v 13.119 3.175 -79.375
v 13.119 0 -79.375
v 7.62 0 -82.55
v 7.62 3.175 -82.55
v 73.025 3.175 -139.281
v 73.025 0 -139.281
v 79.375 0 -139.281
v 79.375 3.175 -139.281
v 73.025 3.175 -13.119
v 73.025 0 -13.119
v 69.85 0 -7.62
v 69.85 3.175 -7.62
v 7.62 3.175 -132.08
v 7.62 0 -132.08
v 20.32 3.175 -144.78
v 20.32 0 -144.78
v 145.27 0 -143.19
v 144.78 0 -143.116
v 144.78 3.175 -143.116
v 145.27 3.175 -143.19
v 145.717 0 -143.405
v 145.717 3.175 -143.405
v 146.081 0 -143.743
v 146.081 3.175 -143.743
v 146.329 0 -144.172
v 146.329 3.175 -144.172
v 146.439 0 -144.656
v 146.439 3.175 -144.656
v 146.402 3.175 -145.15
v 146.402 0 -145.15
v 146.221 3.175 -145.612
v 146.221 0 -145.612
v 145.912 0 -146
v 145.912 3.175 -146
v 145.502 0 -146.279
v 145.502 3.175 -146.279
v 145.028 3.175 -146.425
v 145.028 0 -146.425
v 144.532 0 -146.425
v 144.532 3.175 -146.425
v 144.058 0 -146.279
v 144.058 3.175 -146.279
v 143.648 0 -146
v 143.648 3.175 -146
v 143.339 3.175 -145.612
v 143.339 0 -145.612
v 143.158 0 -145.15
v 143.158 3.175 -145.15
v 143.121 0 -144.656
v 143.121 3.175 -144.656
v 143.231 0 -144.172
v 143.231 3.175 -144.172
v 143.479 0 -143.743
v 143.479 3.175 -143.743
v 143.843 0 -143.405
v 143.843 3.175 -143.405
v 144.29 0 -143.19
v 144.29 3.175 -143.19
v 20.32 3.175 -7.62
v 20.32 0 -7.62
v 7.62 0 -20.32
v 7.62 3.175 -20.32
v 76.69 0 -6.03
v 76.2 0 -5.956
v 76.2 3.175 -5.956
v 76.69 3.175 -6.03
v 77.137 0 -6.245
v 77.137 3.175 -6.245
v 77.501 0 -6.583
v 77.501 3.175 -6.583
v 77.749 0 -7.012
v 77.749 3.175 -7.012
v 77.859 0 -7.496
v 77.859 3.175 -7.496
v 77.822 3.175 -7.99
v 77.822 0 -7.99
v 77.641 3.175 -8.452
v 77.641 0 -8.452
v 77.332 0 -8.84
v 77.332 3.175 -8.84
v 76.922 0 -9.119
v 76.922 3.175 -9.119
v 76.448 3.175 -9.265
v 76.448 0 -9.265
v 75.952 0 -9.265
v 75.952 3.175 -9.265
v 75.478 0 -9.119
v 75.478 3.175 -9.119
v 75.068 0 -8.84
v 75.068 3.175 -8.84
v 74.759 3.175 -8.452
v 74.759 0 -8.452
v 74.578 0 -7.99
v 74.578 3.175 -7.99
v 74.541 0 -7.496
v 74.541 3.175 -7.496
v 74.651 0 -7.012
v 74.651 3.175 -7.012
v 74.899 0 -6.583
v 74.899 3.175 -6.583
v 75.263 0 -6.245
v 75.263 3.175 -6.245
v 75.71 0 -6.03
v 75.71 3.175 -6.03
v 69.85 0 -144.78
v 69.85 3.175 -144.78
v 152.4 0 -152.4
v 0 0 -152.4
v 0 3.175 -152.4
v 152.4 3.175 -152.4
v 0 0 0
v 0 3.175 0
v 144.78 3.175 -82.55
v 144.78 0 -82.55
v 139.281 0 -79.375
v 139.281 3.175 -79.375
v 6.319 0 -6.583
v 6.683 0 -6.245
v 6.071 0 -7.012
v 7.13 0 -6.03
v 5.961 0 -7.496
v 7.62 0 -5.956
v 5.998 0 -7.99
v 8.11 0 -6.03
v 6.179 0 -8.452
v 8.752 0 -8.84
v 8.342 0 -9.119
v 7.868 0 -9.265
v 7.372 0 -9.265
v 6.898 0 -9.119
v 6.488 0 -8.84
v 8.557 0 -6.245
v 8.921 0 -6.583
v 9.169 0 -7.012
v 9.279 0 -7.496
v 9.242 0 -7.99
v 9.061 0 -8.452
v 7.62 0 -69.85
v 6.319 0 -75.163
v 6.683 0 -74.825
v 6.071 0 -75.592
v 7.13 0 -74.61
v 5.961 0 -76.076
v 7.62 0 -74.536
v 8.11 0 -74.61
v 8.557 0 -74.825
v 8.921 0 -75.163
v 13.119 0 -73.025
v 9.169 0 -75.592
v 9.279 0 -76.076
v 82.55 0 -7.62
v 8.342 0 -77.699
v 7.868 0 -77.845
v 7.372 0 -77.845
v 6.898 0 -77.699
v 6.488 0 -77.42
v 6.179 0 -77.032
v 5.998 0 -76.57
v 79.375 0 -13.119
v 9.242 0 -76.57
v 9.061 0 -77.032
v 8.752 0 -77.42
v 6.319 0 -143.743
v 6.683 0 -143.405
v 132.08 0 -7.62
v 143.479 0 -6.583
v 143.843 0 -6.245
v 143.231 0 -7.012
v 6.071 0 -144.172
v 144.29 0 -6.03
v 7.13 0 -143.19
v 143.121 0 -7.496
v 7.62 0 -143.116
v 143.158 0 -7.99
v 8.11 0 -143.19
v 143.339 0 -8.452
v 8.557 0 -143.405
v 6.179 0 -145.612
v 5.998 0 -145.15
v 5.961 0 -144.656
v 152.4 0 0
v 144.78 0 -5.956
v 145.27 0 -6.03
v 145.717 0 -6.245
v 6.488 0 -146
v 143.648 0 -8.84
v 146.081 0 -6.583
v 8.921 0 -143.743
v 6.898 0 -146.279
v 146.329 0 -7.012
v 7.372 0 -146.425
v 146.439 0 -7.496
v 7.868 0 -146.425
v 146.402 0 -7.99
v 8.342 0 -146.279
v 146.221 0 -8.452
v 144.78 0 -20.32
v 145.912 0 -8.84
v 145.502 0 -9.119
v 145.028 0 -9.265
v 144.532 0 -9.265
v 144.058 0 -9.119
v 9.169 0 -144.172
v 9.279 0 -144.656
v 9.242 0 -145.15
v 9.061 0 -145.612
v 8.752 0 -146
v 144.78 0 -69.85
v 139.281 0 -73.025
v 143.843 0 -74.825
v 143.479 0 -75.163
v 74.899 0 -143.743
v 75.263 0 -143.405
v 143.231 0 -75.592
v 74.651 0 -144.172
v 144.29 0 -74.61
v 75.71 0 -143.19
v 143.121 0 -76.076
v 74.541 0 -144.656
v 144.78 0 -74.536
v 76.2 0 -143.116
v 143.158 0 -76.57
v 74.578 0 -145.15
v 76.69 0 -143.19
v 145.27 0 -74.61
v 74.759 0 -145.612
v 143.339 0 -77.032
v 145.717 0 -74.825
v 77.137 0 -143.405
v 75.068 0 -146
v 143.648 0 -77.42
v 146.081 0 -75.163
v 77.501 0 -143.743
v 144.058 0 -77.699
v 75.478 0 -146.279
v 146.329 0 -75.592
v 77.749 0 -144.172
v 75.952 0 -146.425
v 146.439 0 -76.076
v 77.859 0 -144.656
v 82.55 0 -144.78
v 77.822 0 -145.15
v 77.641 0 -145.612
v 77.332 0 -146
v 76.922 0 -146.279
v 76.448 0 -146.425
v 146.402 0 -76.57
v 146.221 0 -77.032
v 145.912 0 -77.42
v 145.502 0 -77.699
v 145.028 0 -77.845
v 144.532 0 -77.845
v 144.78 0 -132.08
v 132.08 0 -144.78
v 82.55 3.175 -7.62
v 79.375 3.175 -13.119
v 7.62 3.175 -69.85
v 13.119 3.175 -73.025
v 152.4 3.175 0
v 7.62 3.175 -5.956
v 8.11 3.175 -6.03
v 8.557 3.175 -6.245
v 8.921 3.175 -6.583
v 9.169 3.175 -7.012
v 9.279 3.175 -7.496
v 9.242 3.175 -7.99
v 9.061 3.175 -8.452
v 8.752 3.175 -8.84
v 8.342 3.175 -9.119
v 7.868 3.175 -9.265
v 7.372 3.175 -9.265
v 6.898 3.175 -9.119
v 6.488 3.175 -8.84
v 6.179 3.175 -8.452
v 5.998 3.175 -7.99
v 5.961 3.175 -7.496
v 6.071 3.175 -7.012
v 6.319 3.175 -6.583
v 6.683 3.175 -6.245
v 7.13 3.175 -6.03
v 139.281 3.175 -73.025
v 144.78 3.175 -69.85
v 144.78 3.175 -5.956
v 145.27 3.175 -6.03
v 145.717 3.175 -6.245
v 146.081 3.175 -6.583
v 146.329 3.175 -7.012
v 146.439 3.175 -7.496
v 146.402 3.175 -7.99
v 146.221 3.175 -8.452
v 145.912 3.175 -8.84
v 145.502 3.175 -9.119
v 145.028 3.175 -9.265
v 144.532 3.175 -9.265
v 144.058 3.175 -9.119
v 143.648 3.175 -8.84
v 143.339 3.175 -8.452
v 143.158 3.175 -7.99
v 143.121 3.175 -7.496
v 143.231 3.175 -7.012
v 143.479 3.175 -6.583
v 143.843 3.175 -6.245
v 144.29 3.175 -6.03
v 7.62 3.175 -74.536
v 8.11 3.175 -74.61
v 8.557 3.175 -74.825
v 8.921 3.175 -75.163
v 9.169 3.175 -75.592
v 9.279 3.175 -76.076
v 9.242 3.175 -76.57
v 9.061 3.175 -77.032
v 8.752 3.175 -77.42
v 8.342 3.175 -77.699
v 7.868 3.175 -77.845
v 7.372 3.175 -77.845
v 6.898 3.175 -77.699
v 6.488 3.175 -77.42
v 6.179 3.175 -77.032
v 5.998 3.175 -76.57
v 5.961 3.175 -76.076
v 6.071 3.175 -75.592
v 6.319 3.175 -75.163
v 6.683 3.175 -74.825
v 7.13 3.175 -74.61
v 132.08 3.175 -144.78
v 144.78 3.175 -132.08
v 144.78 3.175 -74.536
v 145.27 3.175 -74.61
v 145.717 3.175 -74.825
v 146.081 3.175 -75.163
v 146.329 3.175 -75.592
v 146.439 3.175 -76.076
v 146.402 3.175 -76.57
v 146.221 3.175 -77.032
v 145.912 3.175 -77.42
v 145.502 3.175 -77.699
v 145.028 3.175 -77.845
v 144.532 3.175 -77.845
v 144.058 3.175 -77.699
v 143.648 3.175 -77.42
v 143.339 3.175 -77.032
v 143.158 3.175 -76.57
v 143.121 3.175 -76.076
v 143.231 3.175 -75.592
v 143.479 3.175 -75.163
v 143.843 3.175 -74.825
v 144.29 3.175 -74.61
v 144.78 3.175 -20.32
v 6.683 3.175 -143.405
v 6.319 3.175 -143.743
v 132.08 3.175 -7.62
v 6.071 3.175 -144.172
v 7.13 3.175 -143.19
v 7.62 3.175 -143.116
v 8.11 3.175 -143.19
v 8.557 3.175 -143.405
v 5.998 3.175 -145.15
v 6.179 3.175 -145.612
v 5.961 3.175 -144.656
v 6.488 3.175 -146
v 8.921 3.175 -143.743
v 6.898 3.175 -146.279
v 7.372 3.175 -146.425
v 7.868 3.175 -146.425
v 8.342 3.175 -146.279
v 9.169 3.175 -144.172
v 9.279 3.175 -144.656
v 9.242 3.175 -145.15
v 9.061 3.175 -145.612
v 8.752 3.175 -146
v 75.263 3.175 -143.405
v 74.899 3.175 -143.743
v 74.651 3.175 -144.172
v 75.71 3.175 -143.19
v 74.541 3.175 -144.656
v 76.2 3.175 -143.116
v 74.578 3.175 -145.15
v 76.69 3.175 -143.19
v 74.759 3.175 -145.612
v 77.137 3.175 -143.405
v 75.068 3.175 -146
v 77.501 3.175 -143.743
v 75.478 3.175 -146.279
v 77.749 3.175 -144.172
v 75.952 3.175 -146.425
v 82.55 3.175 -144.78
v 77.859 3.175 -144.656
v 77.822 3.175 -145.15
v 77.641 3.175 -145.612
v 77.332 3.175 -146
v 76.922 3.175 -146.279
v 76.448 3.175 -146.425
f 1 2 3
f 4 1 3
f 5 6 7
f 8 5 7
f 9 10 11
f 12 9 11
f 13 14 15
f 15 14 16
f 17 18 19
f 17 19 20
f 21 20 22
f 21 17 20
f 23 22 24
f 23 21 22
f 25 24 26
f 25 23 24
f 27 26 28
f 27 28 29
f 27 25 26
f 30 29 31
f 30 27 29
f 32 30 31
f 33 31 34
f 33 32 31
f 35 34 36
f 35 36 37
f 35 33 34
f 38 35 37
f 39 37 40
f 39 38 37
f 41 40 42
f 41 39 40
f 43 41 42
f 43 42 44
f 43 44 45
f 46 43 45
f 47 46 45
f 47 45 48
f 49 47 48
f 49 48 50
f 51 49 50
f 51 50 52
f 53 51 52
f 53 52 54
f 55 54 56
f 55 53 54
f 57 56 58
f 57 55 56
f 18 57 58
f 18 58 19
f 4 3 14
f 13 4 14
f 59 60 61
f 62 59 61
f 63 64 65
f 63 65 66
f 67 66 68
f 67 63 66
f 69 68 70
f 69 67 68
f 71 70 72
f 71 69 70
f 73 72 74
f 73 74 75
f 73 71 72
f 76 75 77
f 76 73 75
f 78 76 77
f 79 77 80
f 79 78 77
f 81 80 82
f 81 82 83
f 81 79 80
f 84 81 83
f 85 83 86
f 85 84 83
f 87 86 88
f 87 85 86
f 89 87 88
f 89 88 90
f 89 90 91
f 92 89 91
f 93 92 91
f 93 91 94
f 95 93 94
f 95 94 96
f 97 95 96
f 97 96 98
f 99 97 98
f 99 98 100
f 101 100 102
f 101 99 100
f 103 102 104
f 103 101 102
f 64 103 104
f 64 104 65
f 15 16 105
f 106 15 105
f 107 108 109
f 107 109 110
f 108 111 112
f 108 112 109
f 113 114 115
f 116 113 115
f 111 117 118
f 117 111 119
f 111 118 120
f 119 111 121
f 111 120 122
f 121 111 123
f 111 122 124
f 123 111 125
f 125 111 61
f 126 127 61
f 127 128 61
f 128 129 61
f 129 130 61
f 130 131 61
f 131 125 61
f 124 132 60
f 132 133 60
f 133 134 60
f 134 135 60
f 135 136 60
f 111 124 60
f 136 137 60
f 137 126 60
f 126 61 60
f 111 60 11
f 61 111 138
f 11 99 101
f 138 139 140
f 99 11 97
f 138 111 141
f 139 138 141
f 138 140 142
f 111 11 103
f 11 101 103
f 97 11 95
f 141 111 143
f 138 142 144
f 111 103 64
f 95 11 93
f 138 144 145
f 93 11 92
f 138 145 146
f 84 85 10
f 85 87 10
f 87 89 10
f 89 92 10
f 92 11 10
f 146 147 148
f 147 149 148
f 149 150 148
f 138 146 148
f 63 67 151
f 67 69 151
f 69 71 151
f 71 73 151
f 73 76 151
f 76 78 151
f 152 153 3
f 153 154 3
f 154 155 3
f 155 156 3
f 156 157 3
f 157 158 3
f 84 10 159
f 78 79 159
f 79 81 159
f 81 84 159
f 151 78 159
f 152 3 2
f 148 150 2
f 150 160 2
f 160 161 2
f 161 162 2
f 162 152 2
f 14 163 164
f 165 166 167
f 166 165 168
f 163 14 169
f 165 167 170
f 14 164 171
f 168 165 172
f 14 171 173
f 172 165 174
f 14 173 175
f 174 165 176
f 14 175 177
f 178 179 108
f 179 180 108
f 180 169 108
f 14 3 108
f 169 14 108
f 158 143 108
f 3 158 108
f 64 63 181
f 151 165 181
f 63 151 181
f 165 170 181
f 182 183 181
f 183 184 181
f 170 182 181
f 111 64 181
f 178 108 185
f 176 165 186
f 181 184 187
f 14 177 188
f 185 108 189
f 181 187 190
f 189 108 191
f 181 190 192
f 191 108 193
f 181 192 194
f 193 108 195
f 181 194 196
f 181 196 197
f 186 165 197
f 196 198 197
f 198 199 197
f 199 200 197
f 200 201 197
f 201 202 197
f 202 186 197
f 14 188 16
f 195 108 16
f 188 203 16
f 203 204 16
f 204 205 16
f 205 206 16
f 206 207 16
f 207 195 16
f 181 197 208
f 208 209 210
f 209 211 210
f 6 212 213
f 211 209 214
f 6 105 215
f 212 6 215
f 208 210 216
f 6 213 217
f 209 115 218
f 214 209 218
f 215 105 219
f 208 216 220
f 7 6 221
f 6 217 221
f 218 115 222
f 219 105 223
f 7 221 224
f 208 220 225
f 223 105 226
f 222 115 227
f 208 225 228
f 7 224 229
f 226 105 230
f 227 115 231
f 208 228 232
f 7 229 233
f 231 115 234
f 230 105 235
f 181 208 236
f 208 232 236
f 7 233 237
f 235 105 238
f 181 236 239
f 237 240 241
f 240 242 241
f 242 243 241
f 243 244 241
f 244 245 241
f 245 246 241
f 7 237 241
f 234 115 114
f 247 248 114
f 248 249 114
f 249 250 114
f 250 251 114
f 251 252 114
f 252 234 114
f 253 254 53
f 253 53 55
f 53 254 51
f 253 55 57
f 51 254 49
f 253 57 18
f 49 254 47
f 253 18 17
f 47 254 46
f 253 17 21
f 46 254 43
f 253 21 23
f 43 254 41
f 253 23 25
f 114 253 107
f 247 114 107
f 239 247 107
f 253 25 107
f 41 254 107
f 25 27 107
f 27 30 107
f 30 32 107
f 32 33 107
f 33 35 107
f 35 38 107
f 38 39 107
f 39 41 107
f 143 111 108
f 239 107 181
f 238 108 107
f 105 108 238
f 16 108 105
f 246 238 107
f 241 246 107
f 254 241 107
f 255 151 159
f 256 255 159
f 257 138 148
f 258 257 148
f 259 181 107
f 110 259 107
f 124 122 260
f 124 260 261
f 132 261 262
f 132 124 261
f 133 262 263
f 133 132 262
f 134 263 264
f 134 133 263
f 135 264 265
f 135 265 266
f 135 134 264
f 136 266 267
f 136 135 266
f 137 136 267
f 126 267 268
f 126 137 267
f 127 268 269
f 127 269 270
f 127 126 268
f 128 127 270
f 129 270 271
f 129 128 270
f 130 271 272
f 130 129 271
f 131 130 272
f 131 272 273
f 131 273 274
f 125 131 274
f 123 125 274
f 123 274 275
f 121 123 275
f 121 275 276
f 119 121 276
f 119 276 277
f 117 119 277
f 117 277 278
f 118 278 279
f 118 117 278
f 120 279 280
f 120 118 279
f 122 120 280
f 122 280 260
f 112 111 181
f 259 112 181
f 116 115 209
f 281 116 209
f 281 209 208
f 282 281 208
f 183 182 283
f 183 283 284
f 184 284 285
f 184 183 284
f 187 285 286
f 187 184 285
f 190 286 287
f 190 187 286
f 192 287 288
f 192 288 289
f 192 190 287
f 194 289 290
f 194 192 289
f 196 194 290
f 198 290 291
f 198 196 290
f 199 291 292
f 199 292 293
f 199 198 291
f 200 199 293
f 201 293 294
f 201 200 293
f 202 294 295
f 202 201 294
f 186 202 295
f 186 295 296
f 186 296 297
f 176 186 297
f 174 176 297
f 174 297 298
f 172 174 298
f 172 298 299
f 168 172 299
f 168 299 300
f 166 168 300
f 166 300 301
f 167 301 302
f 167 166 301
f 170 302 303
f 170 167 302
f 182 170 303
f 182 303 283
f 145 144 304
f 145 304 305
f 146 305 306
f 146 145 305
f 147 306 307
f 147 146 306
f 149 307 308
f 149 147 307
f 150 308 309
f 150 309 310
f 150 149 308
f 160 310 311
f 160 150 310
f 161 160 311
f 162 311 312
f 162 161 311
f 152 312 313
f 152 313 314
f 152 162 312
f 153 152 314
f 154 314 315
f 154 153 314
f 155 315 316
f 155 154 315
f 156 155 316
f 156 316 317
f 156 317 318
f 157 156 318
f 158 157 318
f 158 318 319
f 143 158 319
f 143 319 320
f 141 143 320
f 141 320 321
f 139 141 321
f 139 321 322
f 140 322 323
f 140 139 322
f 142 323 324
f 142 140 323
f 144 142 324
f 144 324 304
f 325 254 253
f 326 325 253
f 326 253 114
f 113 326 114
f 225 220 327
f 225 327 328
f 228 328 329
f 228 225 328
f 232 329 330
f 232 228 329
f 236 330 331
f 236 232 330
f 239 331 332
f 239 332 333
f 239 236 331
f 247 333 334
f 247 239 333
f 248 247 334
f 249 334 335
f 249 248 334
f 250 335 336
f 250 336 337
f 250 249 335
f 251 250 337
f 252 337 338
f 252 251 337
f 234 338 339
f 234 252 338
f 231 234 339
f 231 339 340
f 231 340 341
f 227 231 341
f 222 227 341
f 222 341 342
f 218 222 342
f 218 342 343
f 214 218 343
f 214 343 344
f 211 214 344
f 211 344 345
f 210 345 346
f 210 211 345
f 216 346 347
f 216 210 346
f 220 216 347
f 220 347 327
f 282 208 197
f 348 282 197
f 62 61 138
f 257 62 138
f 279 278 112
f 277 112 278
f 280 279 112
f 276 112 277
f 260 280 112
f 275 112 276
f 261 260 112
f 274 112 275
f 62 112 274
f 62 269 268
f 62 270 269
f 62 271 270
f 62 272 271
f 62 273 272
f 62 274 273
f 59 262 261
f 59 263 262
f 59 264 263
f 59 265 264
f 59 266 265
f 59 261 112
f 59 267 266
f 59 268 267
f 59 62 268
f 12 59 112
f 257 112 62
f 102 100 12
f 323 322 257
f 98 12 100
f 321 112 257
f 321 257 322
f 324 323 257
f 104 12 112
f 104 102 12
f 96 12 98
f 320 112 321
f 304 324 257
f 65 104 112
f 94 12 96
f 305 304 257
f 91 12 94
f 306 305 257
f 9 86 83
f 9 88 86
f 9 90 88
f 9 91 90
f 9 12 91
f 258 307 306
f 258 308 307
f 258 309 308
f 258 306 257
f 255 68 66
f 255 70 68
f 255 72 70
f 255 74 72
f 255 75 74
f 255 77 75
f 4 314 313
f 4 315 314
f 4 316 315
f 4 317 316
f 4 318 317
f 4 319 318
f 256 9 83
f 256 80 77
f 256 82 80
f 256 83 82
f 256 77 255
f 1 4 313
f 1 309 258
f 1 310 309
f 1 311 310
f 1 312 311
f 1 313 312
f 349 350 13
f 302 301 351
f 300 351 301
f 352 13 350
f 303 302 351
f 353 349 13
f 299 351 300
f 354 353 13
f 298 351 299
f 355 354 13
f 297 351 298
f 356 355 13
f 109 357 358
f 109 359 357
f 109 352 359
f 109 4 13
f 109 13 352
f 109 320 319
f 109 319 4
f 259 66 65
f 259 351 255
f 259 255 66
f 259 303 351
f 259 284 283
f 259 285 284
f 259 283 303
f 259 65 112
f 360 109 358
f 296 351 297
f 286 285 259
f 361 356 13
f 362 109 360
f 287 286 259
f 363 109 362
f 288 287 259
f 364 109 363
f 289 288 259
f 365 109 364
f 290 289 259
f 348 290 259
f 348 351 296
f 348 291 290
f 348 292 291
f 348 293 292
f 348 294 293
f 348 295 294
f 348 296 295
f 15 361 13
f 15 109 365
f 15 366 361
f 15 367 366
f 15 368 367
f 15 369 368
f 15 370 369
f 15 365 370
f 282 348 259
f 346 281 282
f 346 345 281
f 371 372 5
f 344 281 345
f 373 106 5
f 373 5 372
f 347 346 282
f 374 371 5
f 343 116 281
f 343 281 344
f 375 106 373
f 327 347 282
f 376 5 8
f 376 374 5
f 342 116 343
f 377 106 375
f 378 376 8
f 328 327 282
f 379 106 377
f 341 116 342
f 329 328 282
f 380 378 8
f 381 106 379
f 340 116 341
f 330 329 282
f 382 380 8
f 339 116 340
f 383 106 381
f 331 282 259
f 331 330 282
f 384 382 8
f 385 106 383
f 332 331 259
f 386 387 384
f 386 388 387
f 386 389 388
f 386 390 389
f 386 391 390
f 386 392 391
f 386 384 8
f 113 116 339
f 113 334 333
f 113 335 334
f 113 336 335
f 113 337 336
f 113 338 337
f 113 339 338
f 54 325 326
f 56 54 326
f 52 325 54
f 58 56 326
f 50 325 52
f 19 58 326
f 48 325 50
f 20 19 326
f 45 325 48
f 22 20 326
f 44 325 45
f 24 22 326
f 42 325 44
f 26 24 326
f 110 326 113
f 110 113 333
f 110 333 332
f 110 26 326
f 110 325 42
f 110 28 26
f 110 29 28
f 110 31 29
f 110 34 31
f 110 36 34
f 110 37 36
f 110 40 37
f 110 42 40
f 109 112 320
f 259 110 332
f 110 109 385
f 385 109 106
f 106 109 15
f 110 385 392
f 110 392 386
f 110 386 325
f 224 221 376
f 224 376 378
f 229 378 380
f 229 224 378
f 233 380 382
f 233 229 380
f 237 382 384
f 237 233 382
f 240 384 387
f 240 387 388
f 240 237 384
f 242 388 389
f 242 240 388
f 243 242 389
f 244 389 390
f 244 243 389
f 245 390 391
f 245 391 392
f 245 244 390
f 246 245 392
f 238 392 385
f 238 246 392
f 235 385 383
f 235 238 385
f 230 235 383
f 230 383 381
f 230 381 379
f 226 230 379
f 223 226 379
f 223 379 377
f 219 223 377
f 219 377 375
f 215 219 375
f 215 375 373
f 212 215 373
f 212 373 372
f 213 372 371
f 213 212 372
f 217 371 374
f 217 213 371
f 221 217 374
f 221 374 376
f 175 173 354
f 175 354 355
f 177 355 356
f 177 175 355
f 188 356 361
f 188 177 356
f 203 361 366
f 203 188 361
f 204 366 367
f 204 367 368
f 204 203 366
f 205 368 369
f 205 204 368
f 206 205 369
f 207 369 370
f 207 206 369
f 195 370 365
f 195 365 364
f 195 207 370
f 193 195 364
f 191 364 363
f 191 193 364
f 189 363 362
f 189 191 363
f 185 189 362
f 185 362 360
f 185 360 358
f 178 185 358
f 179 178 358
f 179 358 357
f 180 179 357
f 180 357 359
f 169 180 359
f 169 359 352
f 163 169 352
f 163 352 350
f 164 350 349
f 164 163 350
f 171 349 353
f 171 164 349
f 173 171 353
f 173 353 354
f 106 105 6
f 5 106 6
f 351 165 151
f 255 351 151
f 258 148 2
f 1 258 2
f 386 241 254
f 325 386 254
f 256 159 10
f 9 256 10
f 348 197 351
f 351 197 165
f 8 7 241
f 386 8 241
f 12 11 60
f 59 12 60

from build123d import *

# Parameters (mm, degrees)
SKETCH1_W           = 152.4
SKETCH1_H           = 152.4
SKETCH1_R           = 1.6637
BOSS_EXTRUDE4_DEPTH = 3.175


with BuildPart() as part:
    # Sketch1 → Boss-Extrude4 (new body)
    with BuildSketch(Plane(origin=(0, 0, 0), x_dir=(1, 0, 0), z_dir=(0, 1, 0))):
        with Locations((76.2, 76.2)):
            Rectangle(SKETCH1_W, SKETCH1_H)
        with Locations(Location((7.62, 7.62, 0), (0, 0, 270))):
            Circle(SKETCH1_R, mode=Mode.SUBTRACT)
        with Locations(Location((7.62, 144.78, 0), (0, 0, 270))):
            Circle(SKETCH1_R, mode=Mode.SUBTRACT)
        with Locations(Location((144.78, 144.78, 0), (0, 0, 270))):
            Circle(SKETCH1_R, mode=Mode.SUBTRACT)
        with Locations(Location((144.78, 7.62, 0), (0, 0, 270))):
            Circle(SKETCH1_R, mode=Mode.SUBTRACT)
        with Locations(Location((76.2, 7.62, 0), (0, 0, 270))):
            Circle(SKETCH1_R, mode=Mode.SUBTRACT)
        with Locations(Location((76.2, 144.78, 0), (0, 0, 270))):
            Circle(SKETCH1_R, mode=Mode.SUBTRACT)
        with Locations(Location((144.78, 76.2, 0), (0, 0, 270))):
            Circle(SKETCH1_R, mode=Mode.SUBTRACT)
        with Locations(Location((7.62, 76.2, 0), (0, 0, 270))):
            Circle(SKETCH1_R, mode=Mode.SUBTRACT)
        Polygon((69.85, 7.62), (20.32, 7.62), (7.62, 20.32), (7.62, 69.85), (13.119261314, 73.025), (13.119261314, 79.375), (7.62, 82.55), (7.62, 132.08), (20.32, 144.78), (69.85, 144.78), (73.025, 139.280738686), (79.375, 139.280738686), (82.55, 144.78), (132.08, 144.78), (144.78, 132.08), (144.78, 82.55), (139.280738686, 79.375), (139.280738686, 73.025), (144.78, 69.85), (144.78, 20.32), (132.08, 7.62), (82.55, 7.62), (79.375, 13.119261314), (73.025, 13.119261314), align=None, mode=Mode.SUBTRACT)
    extrude(amount=BOSS_EXTRUDE4_DEPTH)


solid = part.part
